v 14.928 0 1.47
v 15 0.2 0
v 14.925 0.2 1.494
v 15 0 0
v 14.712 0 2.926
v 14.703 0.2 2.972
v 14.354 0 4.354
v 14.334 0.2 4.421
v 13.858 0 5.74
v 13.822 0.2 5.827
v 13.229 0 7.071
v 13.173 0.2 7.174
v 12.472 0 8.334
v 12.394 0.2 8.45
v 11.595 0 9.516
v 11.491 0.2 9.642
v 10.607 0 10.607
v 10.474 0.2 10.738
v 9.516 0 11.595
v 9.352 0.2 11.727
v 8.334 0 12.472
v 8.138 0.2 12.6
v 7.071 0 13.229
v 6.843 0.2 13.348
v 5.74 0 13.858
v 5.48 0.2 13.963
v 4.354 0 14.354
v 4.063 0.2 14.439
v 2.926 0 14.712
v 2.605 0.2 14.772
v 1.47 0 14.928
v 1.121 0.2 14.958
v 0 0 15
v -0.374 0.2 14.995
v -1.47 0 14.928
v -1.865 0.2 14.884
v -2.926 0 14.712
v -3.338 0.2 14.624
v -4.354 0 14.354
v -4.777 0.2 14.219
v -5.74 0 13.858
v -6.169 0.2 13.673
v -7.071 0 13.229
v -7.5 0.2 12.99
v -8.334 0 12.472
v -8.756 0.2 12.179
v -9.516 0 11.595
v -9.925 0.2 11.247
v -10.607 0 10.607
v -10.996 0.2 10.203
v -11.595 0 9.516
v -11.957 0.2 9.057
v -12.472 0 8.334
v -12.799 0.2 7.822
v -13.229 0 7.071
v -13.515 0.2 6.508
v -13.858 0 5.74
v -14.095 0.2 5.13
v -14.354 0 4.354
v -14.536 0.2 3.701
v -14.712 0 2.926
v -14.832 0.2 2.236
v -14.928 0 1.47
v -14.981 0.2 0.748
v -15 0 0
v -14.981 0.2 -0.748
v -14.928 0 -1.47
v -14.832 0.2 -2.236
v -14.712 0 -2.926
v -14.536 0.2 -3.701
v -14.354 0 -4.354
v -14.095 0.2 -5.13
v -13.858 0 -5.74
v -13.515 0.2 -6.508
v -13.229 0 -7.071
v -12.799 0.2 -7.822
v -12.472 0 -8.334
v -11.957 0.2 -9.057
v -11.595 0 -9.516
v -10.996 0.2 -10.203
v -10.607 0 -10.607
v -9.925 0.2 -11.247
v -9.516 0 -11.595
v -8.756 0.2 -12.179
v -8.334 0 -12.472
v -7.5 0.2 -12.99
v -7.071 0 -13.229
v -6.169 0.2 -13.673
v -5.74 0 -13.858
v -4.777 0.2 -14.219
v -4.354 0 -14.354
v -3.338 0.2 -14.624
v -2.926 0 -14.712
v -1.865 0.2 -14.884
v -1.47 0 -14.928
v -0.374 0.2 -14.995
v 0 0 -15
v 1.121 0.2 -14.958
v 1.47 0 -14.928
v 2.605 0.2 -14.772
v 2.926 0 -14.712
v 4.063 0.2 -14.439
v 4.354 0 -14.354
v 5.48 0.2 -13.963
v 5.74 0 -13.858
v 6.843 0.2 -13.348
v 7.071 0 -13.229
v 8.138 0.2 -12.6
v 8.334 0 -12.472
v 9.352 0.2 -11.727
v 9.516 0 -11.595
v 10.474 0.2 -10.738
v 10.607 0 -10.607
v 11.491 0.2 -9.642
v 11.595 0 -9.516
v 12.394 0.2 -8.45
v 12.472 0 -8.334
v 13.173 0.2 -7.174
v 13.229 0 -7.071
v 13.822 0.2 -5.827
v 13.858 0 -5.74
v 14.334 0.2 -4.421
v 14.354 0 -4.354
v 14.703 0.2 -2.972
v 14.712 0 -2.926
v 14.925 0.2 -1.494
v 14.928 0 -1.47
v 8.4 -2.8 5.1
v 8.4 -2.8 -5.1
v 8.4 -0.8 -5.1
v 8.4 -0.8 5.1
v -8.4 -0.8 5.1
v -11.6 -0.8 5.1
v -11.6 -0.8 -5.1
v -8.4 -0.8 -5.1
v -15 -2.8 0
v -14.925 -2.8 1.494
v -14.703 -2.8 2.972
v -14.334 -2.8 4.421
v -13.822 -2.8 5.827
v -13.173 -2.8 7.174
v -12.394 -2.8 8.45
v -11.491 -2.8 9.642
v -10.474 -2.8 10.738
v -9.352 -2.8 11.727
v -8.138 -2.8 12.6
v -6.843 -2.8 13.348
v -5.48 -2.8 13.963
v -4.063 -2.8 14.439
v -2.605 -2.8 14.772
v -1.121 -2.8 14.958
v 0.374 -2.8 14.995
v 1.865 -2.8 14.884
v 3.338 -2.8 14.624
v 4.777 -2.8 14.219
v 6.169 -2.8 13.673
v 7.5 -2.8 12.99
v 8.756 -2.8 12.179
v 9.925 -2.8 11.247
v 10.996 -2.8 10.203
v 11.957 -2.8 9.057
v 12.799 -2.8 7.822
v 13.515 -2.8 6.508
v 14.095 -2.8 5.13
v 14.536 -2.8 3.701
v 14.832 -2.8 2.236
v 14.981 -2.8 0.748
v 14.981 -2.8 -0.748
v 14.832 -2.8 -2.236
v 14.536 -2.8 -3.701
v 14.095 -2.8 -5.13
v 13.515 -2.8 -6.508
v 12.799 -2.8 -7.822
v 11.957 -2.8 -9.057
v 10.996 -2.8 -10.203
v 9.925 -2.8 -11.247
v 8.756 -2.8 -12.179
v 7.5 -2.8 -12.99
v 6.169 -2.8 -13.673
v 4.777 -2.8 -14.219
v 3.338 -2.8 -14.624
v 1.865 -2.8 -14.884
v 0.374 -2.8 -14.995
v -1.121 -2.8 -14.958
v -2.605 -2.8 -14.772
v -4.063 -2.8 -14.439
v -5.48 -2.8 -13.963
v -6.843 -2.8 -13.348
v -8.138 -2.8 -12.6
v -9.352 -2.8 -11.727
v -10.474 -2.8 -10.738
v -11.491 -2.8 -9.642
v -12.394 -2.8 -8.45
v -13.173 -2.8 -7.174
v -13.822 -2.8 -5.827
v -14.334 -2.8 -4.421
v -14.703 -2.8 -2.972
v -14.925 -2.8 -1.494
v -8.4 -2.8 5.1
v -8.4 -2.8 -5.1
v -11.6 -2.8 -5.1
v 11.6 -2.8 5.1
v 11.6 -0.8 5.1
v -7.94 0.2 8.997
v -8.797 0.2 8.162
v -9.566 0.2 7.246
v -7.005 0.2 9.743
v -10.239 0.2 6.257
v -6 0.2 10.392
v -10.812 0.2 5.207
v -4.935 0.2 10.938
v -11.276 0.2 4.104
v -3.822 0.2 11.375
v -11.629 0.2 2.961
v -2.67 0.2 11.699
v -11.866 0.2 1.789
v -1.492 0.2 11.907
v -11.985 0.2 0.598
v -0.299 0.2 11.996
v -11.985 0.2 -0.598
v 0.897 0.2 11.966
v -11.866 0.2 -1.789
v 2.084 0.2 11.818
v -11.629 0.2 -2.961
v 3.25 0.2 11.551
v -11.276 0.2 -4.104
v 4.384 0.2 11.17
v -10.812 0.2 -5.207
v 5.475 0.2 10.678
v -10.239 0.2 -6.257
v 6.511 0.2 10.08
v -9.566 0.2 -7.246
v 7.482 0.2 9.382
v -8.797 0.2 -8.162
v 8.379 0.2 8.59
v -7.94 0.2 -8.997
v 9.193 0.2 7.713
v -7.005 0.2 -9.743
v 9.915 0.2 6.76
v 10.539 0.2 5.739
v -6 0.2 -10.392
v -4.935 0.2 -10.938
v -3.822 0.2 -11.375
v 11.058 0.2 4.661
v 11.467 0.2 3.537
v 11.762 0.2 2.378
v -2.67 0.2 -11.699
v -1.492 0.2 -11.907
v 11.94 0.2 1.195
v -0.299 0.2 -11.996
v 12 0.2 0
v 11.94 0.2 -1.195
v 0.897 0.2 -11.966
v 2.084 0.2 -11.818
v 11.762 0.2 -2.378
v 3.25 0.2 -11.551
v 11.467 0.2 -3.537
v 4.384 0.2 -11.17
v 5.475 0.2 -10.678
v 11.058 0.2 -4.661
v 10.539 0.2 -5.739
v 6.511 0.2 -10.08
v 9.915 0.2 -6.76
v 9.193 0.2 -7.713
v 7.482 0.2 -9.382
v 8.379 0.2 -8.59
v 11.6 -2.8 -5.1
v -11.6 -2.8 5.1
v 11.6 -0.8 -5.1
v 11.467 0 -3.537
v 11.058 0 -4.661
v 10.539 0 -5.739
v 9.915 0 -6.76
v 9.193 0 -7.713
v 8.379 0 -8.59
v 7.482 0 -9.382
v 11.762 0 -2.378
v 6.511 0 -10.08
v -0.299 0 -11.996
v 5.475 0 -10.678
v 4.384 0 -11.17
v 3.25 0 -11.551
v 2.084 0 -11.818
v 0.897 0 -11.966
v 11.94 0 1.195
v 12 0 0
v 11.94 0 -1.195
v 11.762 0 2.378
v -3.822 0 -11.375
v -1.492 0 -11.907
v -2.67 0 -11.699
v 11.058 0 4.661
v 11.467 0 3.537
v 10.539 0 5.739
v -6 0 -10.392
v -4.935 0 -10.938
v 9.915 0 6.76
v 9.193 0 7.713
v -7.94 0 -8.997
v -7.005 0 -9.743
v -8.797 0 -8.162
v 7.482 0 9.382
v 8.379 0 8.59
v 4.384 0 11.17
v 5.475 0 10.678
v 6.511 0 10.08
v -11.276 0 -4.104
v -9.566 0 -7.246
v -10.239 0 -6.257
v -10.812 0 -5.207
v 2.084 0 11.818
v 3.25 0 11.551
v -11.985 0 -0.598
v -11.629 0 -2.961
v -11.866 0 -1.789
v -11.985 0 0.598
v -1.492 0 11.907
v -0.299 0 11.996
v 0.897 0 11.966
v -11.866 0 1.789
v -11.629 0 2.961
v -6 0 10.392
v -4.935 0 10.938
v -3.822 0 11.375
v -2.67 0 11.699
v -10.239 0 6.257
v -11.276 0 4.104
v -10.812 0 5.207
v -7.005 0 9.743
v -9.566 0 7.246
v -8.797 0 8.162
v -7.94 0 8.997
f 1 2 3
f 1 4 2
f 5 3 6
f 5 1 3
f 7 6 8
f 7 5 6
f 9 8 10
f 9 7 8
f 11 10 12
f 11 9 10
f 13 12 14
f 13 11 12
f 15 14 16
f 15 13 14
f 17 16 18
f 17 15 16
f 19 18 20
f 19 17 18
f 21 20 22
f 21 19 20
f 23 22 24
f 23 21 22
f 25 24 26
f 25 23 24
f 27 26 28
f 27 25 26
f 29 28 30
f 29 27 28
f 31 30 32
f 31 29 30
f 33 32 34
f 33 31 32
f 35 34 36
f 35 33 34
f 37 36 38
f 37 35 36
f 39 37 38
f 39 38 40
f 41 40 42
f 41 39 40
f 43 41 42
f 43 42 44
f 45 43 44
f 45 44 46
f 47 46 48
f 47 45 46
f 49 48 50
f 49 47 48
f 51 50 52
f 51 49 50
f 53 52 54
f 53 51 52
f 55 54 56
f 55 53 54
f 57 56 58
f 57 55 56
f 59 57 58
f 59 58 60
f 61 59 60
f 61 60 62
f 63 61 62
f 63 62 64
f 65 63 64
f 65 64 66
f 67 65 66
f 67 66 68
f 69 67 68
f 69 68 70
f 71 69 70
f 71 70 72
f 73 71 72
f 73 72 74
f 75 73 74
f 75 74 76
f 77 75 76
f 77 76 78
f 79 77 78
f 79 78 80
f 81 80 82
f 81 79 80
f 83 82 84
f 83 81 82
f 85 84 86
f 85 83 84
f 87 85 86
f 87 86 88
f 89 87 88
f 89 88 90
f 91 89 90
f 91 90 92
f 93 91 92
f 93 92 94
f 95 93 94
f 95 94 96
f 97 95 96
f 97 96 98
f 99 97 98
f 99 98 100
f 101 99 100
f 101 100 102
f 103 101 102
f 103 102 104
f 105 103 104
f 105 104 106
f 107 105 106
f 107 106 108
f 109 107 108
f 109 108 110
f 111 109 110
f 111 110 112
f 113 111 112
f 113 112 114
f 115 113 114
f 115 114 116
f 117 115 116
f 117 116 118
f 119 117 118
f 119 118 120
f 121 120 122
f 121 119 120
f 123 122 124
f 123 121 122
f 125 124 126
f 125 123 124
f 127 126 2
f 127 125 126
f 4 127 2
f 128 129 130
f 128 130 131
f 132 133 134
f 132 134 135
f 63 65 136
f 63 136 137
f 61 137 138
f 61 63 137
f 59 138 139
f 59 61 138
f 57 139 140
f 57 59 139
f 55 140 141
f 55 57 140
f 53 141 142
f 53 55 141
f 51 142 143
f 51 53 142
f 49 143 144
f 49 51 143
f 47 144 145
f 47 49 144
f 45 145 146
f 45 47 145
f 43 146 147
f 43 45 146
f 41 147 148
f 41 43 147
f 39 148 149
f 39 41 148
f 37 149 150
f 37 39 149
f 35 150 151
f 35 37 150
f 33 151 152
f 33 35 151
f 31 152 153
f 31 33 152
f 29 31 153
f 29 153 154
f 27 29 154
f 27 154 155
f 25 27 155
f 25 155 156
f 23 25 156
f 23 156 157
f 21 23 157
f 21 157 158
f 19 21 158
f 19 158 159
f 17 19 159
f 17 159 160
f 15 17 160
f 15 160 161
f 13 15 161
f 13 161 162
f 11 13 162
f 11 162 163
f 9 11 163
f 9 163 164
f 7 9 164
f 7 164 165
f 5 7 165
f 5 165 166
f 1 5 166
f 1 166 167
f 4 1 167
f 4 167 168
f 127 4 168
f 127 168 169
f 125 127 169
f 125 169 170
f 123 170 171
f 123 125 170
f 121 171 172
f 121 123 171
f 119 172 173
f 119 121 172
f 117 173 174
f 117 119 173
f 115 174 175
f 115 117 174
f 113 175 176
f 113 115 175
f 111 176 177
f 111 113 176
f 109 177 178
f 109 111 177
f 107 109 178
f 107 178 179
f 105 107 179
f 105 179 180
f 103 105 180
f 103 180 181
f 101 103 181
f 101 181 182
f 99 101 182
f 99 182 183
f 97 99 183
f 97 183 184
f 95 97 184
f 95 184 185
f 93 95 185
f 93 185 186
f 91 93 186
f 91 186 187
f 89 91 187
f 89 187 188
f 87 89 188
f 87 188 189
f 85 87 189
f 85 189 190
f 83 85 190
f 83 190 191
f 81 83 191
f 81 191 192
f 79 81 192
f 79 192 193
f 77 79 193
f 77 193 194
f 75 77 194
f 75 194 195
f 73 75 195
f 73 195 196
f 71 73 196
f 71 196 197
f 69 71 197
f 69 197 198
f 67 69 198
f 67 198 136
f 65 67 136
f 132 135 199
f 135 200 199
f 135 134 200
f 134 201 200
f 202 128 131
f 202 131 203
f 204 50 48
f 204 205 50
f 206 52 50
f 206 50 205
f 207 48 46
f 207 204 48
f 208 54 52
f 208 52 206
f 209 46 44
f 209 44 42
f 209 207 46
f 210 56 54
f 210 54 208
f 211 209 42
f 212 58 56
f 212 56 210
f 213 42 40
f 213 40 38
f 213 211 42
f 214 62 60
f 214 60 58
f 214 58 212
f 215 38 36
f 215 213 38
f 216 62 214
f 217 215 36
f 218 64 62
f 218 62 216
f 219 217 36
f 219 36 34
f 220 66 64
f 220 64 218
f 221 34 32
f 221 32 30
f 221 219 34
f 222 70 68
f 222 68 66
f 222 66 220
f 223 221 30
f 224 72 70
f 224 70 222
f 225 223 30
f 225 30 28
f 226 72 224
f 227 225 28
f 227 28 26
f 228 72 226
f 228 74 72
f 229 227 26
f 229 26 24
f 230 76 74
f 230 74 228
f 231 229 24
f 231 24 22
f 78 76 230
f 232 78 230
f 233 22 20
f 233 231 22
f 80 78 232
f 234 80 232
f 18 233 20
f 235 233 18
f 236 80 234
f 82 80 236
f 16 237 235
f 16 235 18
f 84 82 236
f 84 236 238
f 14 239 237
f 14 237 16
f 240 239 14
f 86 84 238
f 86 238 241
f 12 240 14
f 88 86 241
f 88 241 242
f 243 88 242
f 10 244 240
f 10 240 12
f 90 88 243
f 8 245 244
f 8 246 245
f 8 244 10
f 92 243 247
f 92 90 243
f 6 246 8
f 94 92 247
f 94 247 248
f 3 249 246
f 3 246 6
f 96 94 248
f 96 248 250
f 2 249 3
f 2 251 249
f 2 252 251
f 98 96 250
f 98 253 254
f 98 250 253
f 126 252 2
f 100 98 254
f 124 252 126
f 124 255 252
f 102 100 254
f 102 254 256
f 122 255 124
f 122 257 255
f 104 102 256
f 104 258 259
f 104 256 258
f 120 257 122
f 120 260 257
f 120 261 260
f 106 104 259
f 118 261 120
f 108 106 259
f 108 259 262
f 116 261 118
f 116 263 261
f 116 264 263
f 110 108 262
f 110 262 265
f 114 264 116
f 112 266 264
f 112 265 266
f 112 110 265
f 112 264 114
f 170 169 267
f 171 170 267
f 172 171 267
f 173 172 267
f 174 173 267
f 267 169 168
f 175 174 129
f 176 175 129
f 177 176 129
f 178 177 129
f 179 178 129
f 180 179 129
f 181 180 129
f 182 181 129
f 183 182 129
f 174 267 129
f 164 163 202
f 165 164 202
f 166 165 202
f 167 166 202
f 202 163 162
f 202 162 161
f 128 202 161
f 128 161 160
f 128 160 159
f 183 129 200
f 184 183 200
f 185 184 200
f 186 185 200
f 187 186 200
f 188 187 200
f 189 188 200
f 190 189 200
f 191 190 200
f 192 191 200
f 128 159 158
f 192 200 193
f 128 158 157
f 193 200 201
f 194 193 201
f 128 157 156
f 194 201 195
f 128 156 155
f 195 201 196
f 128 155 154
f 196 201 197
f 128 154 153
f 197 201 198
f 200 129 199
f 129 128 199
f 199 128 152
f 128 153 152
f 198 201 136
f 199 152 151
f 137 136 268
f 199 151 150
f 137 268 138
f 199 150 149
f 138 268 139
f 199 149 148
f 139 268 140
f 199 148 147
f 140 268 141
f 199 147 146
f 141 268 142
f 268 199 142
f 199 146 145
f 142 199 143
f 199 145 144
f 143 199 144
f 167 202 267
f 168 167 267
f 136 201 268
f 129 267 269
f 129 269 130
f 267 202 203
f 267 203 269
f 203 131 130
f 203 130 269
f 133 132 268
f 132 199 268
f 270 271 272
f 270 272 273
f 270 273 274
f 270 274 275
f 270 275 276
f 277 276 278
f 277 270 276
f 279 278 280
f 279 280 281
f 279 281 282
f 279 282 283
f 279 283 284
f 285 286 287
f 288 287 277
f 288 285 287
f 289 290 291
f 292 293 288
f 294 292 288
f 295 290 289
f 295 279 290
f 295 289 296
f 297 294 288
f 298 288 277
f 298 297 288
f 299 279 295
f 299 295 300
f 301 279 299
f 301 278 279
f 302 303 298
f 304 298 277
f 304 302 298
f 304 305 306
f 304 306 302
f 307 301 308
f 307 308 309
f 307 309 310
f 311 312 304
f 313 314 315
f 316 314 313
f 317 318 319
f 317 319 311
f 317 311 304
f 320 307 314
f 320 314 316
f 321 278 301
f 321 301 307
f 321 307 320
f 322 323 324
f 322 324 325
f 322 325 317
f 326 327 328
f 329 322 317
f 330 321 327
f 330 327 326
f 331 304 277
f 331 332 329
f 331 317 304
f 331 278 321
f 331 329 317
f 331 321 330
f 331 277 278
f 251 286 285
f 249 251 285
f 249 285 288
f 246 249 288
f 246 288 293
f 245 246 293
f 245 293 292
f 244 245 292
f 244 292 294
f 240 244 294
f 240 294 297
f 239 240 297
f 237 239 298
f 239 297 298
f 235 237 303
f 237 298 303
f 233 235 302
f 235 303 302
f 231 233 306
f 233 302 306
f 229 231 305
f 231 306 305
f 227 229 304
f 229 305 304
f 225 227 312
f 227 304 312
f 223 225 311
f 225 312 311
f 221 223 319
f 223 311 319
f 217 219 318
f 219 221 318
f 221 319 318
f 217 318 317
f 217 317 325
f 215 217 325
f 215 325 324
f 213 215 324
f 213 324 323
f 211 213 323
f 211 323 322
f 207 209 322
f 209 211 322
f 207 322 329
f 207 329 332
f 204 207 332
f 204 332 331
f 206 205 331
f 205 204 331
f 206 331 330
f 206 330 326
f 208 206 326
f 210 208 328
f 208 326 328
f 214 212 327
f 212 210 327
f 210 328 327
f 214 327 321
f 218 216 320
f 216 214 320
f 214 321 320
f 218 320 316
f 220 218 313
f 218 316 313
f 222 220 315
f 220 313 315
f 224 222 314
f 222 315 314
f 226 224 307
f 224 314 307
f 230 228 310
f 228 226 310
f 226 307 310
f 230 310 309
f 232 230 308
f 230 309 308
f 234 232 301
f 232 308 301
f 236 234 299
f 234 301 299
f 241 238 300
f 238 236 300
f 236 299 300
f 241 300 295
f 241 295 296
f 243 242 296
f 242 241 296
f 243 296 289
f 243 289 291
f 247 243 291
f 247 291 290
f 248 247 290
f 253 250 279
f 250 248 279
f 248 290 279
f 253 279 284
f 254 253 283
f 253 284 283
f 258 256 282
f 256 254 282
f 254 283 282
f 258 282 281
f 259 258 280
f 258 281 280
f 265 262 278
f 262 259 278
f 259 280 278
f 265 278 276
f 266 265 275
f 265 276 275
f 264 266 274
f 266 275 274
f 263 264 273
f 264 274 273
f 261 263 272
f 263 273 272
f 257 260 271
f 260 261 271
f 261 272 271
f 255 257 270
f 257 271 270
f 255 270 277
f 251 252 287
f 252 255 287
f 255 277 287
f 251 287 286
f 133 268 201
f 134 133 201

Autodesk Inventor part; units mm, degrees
ref_plane "YZ Plane" through (0, 0, 0) normal (1, 0, 0) x (0, 1, 0)
ref_plane "XZ Plane" through (0, 0, 0) normal (0, 1, 0) x (-1, 0, 0)
ref_plane "XY Plane" through (0, 0, 0) normal (0, 0, 1) x (1, 0, 0)
sketch "Sketch1" plane through (0, 0, 0) normal (0, 1, 0) x (-1, 0, 0)
  circle A0 centre (0, 0) radius 15
  dimension "d0" = 30
extrude "Extrusion1" add sketch "Sketch1" against normal blind 2.8
sketch "Sketch2" plane through (0, 0, 0) normal (0, 1, 0) x (1, 0, 0)
  line L0 (7.5, -7.5) -> (-7.5, -7.5)
  line L1 (-7.5, -7.5) -> (-7.5, 7.5)
  line L2 (-7.5, 7.5) -> (7.5, 7.5)
  line L3 (7.5, 7.5) -> (7.5, -7.5)
  line L4 (7.5, -7.5) -> (-7.5, 7.5) construction
  line L5 (-7.5, -7.5) -> (7.5, 7.5) construction
  circle A0 centre (0, 0) radius 12
  circle A1 centre (0, 0) radius 15 projected
  dimension "d3" = 15
  dimension "d4" = 15
  dimension "d13" = 3
extrude "Extrusion2" add sketch "Sketch2" along normal blind 0.2 contours A1
sketch "Sketch3" plane through (0, -2.8, 0) normal (0, -1, 0) x (1, 0, 0)
  line L0 (10, 0) -> (-10, 0) construction
  line L1 (-11.6, -5.1) -> (-8.4, -5.1)
  line L2 (-8.4, -5.1) -> (-8.4, 5.1)
  line L3 (-8.4, 5.1) -> (-11.6, 5.1)
  line L4 (-11.6, 5.1) -> (-11.6, -5.1)
  line L5 (-11.6, -5.1) -> (-8.4, 5.1) construction
  line L6 (-8.4, -5.1) -> (-11.6, 5.1) construction
  line L7 (0, -15) -> (0, 15) construction
  circle A0 centre (0, 0) radius 15 construction
  line L8 (11.6, -5.1) -> (8.4, -5.1)
  line L9 (8.4, -5.1) -> (8.4, 5.1)
  line L10 (8.4, 5.1) -> (11.6, 5.1)
  line L11 (11.6, 5.1) -> (11.6, -5.1)
  line L12 (11.6, -5.1) -> (8.4, 5.1) construction
  line L13 (8.4, -5.1) -> (11.6, 5.1) construction
  dimension "d14" = 20
  dimension "d15" = 3.2
  dimension "d16" = 10.2
extrude "Extrusion3" cut sketch "Sketch3" against normal blind 2
extrude "Extrusion4" [suppressed]
extrude "Extrusion5" [suppressed]
properties part number "Tag"
